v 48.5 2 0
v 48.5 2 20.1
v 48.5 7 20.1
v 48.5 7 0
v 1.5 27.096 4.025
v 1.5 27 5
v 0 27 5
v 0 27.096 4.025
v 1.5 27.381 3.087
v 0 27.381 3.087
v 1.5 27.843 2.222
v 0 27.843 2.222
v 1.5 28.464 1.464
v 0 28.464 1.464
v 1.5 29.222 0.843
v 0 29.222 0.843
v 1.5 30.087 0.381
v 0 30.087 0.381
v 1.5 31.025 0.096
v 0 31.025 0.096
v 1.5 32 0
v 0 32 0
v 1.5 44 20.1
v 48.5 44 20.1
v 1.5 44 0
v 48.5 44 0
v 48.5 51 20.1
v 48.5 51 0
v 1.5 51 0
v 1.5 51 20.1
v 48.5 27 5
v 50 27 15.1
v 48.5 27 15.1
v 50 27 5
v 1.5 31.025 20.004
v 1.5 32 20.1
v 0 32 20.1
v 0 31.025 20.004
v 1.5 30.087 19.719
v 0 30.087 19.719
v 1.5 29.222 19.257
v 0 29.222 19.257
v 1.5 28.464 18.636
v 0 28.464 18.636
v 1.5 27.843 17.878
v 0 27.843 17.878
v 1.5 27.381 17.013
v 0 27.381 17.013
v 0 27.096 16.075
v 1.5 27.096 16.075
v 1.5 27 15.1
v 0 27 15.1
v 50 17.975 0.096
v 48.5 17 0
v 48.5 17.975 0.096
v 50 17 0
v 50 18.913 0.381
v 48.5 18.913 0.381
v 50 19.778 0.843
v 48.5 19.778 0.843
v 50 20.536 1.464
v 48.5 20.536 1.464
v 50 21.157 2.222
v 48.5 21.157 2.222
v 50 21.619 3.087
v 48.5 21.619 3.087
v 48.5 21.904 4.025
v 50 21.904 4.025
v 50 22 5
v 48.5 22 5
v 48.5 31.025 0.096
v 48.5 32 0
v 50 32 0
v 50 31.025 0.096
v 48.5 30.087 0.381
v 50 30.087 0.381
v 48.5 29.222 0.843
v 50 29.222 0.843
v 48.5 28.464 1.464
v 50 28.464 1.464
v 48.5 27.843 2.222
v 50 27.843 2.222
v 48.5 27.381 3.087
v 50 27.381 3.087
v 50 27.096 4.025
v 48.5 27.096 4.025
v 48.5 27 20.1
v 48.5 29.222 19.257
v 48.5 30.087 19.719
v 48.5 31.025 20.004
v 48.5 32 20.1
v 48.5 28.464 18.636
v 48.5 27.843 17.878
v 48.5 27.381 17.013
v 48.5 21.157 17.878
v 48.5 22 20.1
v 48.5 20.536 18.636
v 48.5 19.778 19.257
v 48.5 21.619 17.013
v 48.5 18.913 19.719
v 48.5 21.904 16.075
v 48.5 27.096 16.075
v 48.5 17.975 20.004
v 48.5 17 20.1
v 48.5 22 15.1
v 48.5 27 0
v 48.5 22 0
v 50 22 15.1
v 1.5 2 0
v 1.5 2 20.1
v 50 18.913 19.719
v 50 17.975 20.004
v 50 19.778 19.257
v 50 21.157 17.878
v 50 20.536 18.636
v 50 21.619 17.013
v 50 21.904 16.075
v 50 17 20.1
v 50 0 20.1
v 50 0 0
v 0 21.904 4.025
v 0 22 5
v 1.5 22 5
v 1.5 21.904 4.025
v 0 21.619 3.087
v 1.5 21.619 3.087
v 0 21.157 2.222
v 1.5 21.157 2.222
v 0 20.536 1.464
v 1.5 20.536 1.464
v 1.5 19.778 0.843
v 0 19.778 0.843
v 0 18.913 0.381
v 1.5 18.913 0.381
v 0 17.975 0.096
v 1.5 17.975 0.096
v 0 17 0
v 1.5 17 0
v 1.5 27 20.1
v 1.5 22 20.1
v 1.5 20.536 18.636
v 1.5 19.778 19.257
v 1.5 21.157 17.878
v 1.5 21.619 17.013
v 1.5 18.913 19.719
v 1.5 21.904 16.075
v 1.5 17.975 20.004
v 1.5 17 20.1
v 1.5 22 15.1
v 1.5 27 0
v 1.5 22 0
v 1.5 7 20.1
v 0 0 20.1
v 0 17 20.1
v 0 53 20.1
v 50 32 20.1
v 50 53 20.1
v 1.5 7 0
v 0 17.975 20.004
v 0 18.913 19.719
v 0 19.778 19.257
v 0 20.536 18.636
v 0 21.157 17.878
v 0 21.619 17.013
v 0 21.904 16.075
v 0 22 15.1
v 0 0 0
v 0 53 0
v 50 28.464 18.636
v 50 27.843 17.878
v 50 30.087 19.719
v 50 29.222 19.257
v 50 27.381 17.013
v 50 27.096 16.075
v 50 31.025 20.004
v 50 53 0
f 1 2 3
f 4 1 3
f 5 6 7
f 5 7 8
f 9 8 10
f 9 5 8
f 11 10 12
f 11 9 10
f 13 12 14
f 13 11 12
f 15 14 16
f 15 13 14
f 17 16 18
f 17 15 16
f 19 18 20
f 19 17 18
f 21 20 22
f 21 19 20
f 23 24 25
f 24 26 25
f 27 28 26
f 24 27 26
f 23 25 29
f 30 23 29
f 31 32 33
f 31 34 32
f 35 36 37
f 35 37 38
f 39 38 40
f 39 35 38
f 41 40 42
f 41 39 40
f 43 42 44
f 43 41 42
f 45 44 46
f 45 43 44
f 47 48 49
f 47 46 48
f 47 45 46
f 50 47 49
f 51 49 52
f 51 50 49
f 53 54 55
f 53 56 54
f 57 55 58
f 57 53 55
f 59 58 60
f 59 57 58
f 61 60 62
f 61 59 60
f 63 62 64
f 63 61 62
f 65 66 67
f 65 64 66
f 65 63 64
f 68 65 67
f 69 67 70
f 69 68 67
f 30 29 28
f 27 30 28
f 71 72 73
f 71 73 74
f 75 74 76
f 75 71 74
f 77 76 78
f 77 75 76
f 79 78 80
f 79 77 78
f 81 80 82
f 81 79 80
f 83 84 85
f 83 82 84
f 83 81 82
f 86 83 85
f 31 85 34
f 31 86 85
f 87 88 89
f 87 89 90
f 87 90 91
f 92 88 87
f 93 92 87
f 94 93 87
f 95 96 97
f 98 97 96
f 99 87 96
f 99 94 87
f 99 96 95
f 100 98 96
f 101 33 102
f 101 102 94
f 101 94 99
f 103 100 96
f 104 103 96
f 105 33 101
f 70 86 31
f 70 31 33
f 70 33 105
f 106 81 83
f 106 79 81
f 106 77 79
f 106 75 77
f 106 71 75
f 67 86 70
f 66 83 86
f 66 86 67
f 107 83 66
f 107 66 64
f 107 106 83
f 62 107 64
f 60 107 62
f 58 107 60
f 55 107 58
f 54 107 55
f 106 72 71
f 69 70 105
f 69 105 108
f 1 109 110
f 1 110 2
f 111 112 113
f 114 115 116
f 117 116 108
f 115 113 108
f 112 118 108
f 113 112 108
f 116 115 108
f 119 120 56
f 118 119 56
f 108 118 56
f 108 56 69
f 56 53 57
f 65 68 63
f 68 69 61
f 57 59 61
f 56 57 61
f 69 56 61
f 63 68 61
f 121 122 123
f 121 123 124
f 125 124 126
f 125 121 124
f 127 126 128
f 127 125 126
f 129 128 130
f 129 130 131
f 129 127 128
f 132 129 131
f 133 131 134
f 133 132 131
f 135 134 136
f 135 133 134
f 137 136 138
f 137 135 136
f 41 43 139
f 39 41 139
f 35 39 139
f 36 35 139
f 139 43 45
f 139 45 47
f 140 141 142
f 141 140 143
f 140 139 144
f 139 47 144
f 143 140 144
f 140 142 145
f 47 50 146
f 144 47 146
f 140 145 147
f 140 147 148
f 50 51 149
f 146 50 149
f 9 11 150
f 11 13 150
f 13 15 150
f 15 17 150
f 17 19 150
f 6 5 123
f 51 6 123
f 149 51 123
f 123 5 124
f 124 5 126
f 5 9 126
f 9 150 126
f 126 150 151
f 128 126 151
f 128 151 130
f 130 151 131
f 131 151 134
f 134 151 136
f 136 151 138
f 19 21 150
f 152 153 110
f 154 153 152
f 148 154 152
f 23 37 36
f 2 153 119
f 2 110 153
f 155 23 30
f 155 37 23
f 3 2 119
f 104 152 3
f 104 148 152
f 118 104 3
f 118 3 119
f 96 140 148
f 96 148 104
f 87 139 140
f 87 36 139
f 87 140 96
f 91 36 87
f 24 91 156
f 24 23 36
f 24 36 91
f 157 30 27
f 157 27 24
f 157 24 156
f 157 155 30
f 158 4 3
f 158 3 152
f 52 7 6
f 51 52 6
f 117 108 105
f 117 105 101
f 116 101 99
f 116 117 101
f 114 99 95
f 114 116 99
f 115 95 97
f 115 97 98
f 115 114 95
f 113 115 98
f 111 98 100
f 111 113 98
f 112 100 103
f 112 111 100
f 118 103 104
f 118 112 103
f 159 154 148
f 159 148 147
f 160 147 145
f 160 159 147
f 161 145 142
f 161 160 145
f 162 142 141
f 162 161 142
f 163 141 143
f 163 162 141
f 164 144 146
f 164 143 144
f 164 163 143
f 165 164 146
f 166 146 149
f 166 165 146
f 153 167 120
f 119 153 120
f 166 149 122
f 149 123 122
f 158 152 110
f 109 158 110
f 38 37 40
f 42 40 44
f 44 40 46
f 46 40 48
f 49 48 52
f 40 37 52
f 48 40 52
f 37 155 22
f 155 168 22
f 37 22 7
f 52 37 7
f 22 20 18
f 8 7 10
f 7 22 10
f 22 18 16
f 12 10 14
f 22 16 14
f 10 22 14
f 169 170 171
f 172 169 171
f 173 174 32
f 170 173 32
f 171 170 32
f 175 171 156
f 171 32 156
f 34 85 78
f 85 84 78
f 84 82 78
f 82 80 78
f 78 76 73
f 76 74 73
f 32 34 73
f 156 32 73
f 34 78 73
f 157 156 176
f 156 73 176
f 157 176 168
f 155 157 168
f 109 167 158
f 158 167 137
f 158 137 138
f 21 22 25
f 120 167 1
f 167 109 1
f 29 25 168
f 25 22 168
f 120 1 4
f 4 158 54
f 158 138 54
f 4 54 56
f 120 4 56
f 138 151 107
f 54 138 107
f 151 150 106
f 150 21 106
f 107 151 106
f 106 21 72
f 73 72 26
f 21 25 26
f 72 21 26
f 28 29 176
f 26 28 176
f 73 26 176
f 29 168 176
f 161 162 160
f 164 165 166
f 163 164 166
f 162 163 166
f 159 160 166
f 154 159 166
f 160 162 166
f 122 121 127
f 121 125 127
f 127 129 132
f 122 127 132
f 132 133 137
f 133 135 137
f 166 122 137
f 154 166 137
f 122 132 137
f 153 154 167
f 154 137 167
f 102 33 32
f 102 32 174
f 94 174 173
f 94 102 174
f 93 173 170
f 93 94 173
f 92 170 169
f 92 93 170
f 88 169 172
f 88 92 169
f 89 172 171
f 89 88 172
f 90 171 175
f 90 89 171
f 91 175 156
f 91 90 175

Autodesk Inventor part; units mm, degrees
ref_plane "YZ Plane" through (0, 0, 0) normal (1, 0, 0) x (0, 1, 0)
ref_plane "XZ Plane" through (0, 0, 0) normal (0, 1, 0) x (-1, 0, 0)
ref_plane "XY Plane" through (0, 0, 0) normal (0, 0, 1) x (1, 0, 0)
sketch "スケッチ1" plane through (0, 0, 0) normal (0, 0, 1) x (1, 0, 0)
  line L0 (0, 0) -> (50, 0)
  line L1 (50, 0) -> (50, 53)
  line L2 (50, 53) -> (0, 53)
  line L3 (0, 53) -> (0, 0)
  line L4 (1.5, 2) -> (48.5, 2)
  line L5 (48.5, 2) -> (48.5, 7)
  line L6 (48.5, 7) -> (1.5, 7)
  line L7 (1.5, 7) -> (1.5, 2)
  line L8 (1.5, 51) -> (48.5, 51)
  line L9 (48.5, 51) -> (48.5, 44)
  line L10 (48.5, 44) -> (1.5, 44)
  line L11 (1.5, 44) -> (1.5, 51)
  line L12 (0, 27) -> (1.5, 27)
  line L13 (1.5, 27) -> (1.5, 22)
  line L14 (1.5, 22) -> (0, 22)
  line L15 (50, 27) -> (48.5, 27)
  line L16 (48.5, 27) -> (48.5, 22)
  line L17 (48.5, 22) -> (50, 22)
  dimension "d0" = 50
  dimension "d1" = 53
  dimension "d2" = 2
  dimension "d3" = 1.5
  dimension "d4" = 1.5
  dimension "d5" = 5
  dimension "d6" = 2
  dimension "d7" = 7
  dimension "d8" = 5
  dimension "d9" = 17
extrude "押し出し1" add sketch "スケッチ1" along normal blind 20.1 contours L3 L14 L13 L12 L2 L1 L15 L16 L17 L0
fillet "フィレット1" radius 5 8 edges at (0.75, 27, 20.1) (0.75, 27, 0) (0.75, 22, 0) (0.75, 22, 20.1) (49.25, 22, 0) (49.25, 22, 20.1) (49.25, 27, 0) (49.25, 27, 20.1)
properties part number "サーボ"
